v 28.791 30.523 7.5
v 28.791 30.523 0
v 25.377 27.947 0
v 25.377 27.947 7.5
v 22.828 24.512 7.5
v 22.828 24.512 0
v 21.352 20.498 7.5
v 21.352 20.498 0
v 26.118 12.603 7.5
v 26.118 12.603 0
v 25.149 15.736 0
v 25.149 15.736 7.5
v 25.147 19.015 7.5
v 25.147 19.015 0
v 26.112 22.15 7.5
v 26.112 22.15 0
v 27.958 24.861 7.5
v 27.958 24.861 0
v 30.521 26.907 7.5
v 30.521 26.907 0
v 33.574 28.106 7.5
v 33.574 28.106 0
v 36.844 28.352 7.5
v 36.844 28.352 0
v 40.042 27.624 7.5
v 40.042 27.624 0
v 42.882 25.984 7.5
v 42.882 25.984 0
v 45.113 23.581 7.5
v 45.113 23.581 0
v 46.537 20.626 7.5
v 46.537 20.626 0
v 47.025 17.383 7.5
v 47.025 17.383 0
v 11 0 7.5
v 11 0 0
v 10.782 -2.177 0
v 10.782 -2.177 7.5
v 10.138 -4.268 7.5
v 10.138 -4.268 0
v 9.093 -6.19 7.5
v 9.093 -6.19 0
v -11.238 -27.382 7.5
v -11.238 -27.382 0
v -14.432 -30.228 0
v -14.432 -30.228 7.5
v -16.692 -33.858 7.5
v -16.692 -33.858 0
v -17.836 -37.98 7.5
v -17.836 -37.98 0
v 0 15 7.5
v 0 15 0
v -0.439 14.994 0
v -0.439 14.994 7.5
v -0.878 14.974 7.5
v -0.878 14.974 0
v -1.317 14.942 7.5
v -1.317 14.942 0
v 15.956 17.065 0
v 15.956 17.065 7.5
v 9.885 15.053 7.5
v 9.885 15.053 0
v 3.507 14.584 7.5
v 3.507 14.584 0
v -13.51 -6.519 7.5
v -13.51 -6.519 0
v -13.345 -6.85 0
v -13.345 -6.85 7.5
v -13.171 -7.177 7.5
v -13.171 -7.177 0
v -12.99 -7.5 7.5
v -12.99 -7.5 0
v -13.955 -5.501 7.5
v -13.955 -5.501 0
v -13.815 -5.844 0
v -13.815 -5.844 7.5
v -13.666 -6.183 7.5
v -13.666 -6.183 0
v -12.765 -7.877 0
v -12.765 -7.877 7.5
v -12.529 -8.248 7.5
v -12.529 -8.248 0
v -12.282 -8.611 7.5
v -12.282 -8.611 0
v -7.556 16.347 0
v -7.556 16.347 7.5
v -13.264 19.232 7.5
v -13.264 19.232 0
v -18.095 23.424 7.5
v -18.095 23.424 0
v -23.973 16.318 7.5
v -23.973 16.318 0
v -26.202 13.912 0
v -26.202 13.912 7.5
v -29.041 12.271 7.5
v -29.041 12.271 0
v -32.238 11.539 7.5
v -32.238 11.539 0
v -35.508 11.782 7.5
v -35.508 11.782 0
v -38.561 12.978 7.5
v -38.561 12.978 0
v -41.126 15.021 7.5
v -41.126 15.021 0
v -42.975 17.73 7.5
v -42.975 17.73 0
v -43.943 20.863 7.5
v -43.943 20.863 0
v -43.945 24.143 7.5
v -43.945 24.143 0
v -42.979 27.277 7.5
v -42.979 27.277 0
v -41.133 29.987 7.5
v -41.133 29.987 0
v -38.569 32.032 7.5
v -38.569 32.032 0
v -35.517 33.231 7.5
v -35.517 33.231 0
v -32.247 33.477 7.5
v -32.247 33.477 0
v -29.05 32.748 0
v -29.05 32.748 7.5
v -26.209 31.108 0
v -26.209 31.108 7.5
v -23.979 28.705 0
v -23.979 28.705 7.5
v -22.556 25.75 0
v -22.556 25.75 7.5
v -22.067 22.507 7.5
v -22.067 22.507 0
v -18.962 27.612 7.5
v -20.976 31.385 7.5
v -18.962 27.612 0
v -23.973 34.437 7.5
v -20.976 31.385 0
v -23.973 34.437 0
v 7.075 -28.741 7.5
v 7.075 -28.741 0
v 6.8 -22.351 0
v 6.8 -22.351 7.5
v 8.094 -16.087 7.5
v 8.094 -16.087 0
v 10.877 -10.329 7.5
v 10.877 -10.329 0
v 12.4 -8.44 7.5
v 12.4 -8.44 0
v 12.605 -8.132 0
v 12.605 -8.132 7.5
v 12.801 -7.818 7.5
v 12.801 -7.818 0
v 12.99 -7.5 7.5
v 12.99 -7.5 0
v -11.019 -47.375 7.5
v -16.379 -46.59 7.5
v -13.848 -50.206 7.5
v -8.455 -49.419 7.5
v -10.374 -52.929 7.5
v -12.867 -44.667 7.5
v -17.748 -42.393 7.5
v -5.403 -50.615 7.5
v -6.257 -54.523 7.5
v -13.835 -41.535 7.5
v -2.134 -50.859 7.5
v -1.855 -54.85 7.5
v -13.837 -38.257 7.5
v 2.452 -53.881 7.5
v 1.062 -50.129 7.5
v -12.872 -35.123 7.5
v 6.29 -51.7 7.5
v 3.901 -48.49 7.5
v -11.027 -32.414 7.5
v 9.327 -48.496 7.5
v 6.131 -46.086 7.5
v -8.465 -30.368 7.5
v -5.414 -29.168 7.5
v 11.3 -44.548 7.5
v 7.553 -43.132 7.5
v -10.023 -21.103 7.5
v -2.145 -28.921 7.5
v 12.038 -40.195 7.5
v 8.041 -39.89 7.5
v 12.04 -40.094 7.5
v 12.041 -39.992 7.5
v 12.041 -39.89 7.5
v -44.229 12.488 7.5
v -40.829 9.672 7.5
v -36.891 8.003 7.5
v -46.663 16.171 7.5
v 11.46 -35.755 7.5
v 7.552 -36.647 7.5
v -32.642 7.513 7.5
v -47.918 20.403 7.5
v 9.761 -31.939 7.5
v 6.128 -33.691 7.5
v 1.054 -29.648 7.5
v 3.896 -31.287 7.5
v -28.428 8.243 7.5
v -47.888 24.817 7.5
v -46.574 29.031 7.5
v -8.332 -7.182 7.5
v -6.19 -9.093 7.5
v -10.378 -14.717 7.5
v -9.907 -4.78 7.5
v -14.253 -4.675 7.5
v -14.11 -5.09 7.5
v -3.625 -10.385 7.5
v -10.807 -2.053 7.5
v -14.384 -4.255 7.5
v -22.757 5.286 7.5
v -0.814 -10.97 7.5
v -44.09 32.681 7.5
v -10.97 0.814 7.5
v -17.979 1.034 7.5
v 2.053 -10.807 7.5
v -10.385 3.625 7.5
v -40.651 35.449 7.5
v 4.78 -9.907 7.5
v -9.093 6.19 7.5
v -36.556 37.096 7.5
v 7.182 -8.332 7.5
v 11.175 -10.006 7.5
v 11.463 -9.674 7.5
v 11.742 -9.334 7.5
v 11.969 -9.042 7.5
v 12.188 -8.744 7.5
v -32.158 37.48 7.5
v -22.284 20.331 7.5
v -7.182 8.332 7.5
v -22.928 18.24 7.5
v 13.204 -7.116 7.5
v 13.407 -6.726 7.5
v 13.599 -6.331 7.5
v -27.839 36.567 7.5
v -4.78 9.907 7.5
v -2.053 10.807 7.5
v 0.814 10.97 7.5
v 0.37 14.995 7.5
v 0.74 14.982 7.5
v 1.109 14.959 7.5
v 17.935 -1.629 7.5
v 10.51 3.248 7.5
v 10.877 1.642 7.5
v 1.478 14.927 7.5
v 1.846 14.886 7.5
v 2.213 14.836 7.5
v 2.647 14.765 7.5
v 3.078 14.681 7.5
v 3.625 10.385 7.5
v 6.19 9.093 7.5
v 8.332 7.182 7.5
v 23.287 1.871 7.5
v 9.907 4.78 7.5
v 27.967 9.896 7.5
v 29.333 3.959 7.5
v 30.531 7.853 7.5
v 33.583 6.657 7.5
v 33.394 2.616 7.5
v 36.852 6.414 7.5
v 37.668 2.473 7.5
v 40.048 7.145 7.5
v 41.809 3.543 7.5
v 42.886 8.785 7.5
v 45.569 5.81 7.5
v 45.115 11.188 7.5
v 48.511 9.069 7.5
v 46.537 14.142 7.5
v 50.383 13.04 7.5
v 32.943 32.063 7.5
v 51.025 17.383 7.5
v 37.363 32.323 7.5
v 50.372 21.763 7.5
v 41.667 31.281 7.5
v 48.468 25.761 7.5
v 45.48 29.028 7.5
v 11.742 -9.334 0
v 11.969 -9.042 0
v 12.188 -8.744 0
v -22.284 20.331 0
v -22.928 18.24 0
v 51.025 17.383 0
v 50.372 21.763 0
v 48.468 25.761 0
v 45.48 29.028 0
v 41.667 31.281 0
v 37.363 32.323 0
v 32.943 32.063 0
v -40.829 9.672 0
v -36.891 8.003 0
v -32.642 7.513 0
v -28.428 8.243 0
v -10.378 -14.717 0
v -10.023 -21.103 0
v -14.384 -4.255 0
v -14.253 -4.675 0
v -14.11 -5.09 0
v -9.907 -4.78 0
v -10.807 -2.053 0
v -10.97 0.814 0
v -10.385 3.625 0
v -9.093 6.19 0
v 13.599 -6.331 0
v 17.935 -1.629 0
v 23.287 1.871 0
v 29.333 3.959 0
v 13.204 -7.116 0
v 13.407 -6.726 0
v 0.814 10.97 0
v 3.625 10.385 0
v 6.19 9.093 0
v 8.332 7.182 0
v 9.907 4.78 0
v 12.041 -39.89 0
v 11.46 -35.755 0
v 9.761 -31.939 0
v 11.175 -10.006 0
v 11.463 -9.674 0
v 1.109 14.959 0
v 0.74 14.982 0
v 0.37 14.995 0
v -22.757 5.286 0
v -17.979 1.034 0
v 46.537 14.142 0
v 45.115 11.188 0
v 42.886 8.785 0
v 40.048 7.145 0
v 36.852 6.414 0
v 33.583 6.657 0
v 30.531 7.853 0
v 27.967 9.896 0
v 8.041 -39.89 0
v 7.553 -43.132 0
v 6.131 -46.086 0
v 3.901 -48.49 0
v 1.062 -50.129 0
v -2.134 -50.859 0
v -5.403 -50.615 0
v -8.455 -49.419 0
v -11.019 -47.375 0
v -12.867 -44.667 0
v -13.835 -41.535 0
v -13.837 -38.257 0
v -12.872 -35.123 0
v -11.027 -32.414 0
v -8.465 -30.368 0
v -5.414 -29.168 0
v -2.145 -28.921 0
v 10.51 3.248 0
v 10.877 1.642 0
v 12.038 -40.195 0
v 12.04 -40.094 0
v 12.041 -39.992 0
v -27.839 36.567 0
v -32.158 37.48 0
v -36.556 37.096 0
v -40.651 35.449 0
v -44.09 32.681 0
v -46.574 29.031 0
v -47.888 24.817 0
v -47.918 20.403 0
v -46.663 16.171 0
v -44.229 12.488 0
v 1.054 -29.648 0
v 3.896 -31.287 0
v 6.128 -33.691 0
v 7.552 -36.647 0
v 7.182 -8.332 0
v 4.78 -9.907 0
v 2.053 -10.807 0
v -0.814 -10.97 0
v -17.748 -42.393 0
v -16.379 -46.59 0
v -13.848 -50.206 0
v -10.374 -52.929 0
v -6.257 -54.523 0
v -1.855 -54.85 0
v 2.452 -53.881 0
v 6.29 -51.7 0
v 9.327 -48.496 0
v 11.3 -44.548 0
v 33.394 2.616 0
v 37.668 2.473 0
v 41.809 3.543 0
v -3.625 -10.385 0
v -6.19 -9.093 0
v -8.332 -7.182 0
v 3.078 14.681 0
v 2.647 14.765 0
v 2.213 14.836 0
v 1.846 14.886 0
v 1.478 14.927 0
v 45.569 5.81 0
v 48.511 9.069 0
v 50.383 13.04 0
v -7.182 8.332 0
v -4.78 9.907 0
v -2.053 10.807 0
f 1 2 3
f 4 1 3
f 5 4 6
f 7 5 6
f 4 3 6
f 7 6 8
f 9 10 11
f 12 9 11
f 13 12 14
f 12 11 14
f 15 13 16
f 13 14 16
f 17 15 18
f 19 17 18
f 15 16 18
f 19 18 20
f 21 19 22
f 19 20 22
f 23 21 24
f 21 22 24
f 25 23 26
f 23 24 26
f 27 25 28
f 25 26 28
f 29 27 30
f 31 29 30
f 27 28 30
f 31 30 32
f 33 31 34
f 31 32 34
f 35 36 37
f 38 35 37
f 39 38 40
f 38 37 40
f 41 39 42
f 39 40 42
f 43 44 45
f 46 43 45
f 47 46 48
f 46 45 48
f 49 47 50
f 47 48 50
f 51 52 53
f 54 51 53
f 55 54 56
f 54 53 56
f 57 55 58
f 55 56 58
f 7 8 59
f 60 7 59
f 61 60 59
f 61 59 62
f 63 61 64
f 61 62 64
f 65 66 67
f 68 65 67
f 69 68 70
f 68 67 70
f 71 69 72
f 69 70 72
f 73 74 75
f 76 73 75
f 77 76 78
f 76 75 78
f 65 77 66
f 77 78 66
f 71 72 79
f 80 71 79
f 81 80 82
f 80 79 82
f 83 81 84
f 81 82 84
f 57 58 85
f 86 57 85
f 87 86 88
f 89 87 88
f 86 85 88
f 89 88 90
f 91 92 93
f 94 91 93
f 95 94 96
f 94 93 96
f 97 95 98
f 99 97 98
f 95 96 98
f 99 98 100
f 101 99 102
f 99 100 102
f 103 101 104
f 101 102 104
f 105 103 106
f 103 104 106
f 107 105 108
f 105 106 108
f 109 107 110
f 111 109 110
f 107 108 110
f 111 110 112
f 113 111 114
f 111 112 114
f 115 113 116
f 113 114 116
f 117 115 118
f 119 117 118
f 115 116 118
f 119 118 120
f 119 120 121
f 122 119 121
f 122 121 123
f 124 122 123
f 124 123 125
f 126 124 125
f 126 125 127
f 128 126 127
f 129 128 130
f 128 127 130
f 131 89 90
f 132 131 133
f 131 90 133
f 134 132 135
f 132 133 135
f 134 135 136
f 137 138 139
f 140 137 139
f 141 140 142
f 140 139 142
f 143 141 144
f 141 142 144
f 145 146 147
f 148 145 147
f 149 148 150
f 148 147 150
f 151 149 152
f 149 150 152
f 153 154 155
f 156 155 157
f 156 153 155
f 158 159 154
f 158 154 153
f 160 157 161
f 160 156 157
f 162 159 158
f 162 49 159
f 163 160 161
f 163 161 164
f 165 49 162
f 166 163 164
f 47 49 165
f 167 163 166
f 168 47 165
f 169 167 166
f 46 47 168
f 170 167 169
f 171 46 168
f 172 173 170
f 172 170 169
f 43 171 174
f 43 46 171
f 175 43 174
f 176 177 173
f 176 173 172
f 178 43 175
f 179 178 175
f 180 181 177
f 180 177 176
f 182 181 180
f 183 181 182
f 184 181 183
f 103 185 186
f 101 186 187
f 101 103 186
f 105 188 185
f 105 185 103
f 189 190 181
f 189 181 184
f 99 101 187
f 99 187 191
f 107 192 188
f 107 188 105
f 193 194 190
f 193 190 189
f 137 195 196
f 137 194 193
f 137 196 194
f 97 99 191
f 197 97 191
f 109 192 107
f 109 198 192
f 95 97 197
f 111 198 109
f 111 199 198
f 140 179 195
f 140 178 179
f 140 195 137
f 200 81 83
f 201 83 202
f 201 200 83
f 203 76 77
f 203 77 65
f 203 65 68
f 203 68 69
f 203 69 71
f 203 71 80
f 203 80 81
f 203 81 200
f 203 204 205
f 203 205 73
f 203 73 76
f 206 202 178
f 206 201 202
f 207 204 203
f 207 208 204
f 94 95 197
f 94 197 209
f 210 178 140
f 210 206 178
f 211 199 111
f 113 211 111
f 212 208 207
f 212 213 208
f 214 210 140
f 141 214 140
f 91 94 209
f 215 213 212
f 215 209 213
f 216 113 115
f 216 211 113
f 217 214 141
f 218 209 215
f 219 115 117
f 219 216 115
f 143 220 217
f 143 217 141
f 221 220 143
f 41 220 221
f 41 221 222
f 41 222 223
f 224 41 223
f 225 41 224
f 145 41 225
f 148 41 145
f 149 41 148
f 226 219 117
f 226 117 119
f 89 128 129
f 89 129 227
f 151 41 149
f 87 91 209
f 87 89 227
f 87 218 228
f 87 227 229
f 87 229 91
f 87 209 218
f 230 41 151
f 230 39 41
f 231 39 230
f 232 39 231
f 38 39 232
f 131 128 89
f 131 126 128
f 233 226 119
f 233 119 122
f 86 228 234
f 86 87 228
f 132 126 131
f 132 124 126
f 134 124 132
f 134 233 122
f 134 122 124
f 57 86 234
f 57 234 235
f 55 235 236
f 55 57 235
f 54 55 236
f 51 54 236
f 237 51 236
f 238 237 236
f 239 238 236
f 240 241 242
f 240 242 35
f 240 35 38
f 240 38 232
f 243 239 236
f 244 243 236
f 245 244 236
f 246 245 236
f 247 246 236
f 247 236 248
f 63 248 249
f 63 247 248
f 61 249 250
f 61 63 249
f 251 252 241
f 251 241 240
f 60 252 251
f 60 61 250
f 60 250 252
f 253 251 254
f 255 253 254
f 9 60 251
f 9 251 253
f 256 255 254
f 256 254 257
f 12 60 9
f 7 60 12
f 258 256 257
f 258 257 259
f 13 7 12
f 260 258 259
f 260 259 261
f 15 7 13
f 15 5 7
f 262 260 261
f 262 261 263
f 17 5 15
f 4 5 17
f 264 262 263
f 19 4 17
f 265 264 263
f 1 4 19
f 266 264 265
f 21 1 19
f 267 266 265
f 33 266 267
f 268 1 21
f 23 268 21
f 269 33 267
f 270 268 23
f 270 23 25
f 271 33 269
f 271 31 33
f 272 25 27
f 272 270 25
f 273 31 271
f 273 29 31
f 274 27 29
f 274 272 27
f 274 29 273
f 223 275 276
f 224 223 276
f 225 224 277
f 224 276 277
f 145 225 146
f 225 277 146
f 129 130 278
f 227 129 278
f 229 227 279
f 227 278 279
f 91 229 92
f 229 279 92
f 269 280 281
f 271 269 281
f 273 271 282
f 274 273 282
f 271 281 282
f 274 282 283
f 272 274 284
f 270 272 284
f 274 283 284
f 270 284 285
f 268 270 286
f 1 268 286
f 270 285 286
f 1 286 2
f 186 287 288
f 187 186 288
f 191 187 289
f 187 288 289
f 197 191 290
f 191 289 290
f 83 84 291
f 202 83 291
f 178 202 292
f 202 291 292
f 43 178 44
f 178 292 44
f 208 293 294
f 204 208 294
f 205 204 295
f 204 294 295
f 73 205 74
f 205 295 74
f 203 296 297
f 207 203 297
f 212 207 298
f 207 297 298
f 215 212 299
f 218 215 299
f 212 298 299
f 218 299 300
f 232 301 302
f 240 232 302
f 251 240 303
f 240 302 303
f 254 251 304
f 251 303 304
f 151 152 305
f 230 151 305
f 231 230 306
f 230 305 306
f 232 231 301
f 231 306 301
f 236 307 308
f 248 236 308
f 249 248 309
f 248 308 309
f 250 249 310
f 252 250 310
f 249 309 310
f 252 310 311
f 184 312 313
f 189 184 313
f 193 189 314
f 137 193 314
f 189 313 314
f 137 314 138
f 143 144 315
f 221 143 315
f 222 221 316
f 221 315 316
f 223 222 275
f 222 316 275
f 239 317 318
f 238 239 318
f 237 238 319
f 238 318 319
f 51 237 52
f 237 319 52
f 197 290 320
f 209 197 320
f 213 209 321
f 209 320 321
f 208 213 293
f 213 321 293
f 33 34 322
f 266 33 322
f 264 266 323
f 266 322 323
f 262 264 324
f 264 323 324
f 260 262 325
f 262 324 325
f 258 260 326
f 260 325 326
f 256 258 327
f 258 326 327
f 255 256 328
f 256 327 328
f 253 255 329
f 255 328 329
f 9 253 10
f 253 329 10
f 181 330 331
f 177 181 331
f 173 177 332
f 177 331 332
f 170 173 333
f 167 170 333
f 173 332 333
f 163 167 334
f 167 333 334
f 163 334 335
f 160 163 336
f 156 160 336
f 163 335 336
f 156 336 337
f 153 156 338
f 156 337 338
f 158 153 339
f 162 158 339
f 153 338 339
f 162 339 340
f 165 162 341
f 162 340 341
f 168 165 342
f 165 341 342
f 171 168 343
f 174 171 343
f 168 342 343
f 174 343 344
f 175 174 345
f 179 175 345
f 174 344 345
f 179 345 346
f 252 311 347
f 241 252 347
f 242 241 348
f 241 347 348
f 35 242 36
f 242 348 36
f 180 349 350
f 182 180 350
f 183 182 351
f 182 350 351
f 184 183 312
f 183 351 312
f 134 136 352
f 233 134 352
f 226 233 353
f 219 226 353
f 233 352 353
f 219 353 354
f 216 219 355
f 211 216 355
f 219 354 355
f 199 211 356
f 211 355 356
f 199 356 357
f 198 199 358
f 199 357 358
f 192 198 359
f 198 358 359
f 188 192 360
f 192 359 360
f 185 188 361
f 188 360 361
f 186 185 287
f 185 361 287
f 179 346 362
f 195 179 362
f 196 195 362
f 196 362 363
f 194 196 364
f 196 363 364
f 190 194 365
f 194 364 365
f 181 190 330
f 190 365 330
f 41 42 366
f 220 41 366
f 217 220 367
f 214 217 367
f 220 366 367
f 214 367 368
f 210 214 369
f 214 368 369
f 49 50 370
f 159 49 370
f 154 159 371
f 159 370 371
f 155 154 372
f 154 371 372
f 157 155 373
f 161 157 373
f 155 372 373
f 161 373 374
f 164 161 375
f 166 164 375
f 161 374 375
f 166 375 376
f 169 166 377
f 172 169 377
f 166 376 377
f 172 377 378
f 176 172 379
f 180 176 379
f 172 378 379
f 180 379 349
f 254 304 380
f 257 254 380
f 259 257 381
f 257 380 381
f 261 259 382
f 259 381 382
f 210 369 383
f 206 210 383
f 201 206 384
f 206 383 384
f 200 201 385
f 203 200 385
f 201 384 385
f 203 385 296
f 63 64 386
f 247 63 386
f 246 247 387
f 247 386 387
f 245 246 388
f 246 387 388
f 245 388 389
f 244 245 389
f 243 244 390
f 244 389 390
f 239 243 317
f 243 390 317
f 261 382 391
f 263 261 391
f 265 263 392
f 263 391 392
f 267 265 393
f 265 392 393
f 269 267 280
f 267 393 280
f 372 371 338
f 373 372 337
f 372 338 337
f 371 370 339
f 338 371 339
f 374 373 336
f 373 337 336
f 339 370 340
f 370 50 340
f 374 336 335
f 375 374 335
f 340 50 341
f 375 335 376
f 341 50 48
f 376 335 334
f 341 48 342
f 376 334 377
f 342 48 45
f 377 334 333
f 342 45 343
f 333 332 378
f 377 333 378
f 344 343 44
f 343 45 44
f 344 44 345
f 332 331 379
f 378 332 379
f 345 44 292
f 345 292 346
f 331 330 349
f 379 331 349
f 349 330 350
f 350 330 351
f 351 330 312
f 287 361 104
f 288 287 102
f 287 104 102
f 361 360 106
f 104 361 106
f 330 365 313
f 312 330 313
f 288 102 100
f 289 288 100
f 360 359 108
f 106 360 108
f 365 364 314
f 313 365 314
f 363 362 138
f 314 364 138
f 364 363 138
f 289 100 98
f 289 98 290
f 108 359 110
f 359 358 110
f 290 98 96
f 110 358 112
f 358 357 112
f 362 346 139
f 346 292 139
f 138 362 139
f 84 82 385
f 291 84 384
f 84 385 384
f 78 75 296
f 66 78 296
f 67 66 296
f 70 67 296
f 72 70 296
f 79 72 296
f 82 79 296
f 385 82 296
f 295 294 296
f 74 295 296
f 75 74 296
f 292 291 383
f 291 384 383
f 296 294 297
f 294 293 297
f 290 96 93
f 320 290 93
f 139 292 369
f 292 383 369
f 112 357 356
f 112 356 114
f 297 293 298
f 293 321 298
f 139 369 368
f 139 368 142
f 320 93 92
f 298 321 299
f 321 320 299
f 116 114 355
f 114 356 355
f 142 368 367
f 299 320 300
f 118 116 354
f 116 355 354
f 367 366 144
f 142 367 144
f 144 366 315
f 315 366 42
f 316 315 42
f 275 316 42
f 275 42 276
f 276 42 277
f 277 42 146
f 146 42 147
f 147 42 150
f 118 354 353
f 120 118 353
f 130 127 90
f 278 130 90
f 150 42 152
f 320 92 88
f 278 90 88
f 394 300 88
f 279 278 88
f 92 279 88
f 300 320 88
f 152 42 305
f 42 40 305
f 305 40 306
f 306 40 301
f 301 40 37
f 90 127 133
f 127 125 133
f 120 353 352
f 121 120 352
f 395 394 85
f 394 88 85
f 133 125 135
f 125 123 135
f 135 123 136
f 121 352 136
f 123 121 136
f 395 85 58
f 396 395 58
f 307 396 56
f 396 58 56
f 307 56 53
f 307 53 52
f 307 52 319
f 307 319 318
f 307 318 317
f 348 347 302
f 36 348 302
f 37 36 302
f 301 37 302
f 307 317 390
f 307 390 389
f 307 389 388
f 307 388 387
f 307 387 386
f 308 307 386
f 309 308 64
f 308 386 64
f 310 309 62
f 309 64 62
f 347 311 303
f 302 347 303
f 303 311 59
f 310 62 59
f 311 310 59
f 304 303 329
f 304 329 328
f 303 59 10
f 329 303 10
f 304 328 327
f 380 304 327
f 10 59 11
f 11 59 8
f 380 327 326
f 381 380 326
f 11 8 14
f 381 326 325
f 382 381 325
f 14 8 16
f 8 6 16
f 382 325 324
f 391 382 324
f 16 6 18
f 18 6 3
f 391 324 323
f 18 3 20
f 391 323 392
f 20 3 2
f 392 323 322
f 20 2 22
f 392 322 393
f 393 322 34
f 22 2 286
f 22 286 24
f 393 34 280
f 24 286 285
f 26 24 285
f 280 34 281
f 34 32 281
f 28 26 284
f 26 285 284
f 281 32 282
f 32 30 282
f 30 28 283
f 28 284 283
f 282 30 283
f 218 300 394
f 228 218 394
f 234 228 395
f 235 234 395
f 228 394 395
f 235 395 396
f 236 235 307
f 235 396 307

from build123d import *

# Parameters (mm, degrees)
F1_DEPTH = 7.5


with BuildPart() as f1:
    # F0 (on Top) → F1 (new body)
    with BuildSketch(Plane.XY):
        with BuildLine():
            ThreePointArc((9.9070001123, 4.7803084394), (10.7232691199, 2.4518359208), (11, 0))
            ThreePointArc((11, 0), (10.5125414298, -3.2382823666), (9.0933686025, -6.1895595528))
            Line((9.0933686025, -6.1895595528), (12.2828647672, -8.3605456107))
            ThreePointArc((12.2828647672, -8.3605456107), (12.9170786369, -7.3303985813), (13.5985312991, -6.3308724918))
            ThreePointArc((13.5985312991, -6.3308724918), (14.6454424564, -3.2420695947), (15, 0))
            ThreePointArc((15, 0), (14.6226397089, 3.3434126193), (13.5095456076, 6.5186024173))
            Line((13.5095456076, 6.5186024173), (9.9070001123, 4.7803084394))
        make_face()
        with BuildLine():
            ThreePointArc((0.8136315097, 10.9698679922), (6.1895595528, 9.0933686025), (9.9070001123, 4.7803084394))
            Line((9.9070001123, 4.7803084394), (13.5095456076, 6.5186024173))
            ThreePointArc((13.5095456076, 6.5186024173), (9.4154652066, 11.6768580939), (3.5065394099, 14.5843814187))
            ThreePointArc((3.5065394099, 14.5843814187), (2.3000626139, 14.6729470743), (1.0990125047, 14.817545725))
            Line((1.0990125047, 14.817545725), (0.8136315097, 10.9698679922))
        make_face()
        with BuildLine():
            Line((12.2828647672, -8.3605456107), (9.0933686025, -6.1895595528))
            ThreePointArc((9.0933686025, -6.1895595528), (4.7803084394, -9.9070001123), (-0.8136315097, -10.9698679922))
            Line((-0.8136315097, -10.9698679922), (-1.1094975133, -14.9589108985))
            ThreePointArc((-1.1094975133, -14.9589108985), (5.4047231424, -13.9924611043), (10.8771751021, -10.3289429177))
            ThreePointArc((10.8771751021, -10.3289429177), (11.5571136078, -9.3283861911), (12.2828647672, -8.3605456107))
        make_face()
        with BuildLine():
            ThreePointArc((-9.0933686025, 6.1895595528), (-4.7803084394, 9.9070001123), (0.8136315097, 10.9698679922))
            Line((0.8136315097, 10.9698679922), (1.0990125047, 14.817545725))
            ThreePointArc((1.0990125047, 14.817545725), (-0.1102279272, 14.8517175329), (-1.3165692436, 14.9421098051))
            ThreePointArc((-1.3165692436, 14.9421098051), (-7.5897795036, 12.9381315145), (-12.4000480944, 8.4403084812))
            Line((-12.4000480944, 8.4403084812), (-9.0933686025, 6.1895595528))
        make_face()
        with BuildLine():
            Line((22.5159093461, 10.8643373622), (13.5095456076, 6.5186024173))
            ThreePointArc((13.5095456076, 6.5186024173), (14.6226397089, 3.3434126193), (15, 0))
            ThreePointArc((15, 0), (14.6454424564, -3.2420695947), (13.5985312991, -6.3308724918))
            ThreePointArc((13.5985312991, -6.3308724918), (20.5029640043, 0.2861263258), (29.3329113564, 3.958713165))
            ThreePointArc((29.3329113564, 3.958713165), (25.3505772753, 6.8450563796), (22.5159093461, 10.8643373622))
        make_face()
        with BuildLine():
            ThreePointArc((3.5065394099, 14.5843814187), (9.4154652066, 11.6768580939), (13.5095456076, 6.5186024173))
            Line((13.5095456076, 6.5186024173), (22.5159093461, 10.8643373622))
            ThreePointArc((22.5159093461, 10.8643373622), (21.1336653873, 15.5844394293), (21.3524517486, 20.4978999628))
            ThreePointArc((21.3524517486, 20.4978999628), (12.9828009771, 15.8713666716), (3.5065394099, 14.5843814187))
        make_face()
        with BuildLine():
            Line((-1.1094975133, -14.9589108985), (-0.8136315097, -10.9698679922))
            ThreePointArc((-0.8136315097, -10.9698679922), (-6.1895595528, -9.0933686025), (-9.9070001123, -4.7803084394))
            Line((-9.9070001123, -4.7803084394), (-13.381877272, -6.4570001143))
            ThreePointArc((-13.381877272, -6.4570001143), (-12.8068507097, -7.5213189516), (-12.2819620555, -8.6112373133))
            ThreePointArc((-12.2819620555, -8.6112373133), (-7.4098608173, -13.0420076165), (-1.1094975133, -14.9589108985))
        make_face()
        with BuildLine():
            ThreePointArc((12.9903810568, -7.5), (12.6320125035, -7.9264822577), (12.2828647672, -8.3605456107))
            Line((12.2828647672, -8.3605456107), (12.4000480944, -8.4403084812))
            ThreePointArc((12.4000480944, -8.4403084812), (12.7039174324, -7.9756179616), (12.9903810568, -7.5))
        make_face()
        with BuildLine():
            ThreePointArc((13.5985312991, -6.3308724918), (12.9170786369, -7.3303985813), (12.2828647672, -8.3605456107))
            ThreePointArc((12.2828647672, -8.3605456107), (12.6320125035, -7.9264822577), (12.9903810568, -7.5))
            ThreePointArc((12.9903810568, -7.5), (13.3073017494, -6.9221181838), (13.5985312991, -6.3308724918))
        make_face()
        with BuildLine():
            ThreePointArc((11.7417808873, -9.3343763367), (12.0071054891, -8.8445620945), (12.2828647672, -8.3605456107))
            ThreePointArc((12.2828647672, -8.3605456107), (11.5571136078, -9.3283861911), (10.8771751021, -10.3289429177))
            ThreePointArc((10.8771751021, -10.3289429177), (11.3204056104, -9.8411593228), (11.7417808873, -9.3343763367))
        make_face()
        with BuildLine():
            Line((12.4000480944, -8.4403084812), (12.2828647672, -8.3605456107))
            ThreePointArc((12.2828647672, -8.3605456107), (12.0071054891, -8.8445620945), (11.7417808873, -9.3343763367))
            ThreePointArc((11.7417808873, -9.3343763367), (12.0791893759, -8.8934348832), (12.4000480944, -8.4403084812))
        make_face()
        with BuildLine():
            ThreePointArc((-9.9070001123, -4.7803084394), (-10.9698679922, 0.8136315097), (-9.0933686025, 6.1895595528))
            Line((-9.0933686025, 6.1895595528), (-12.4000480944, 8.4403084812))
            ThreePointArc((-12.4000480944, 8.4403084812), (-14.8201883489, 2.3156030104), (-14.383714512, -4.255438501))
            ThreePointArc((-14.383714512, -4.255438501), (-13.8571762217, -5.3445608832), (-13.381877272, -6.4570001143))
            Line((-13.381877272, -6.4570001143), (-9.9070001123, -4.7803084394))
        make_face()
        with BuildLine():
            ThreePointArc((-1.3165692436, 14.9421098051), (-0.1102279272, 14.8517175329), (1.0990125047, 14.817545725))
            ThreePointArc((1.0990125047, 14.817545725), (0.5485287461, 14.9028848578), (0, 15))
            ThreePointArc((0, 15), (-0.6589206796, 14.9855204627), (-1.3165692436, 14.9421098051))
        make_face()
        with BuildLine():
            ThreePointArc((2.2129165924, 14.8358687024), (1.6560627147, 14.8207394268), (1.0990125047, 14.817545725))
            ThreePointArc((1.0990125047, 14.817545725), (2.3000626139, 14.6729470743), (3.5065394099, 14.5843814187))
            ThreePointArc((3.5065394099, 14.5843814187), (2.862491171, 14.7243385011), (2.2129165924, 14.8358687024))
        make_face()
        with BuildLine():
            ThreePointArc((0, 15), (0.5485287461, 14.9028848578), (1.0990125047, 14.817545725))
            Line((1.0990125047, 14.817545725), (1.1094975133, 14.9589108985))
            ThreePointArc((1.1094975133, 14.9589108985), (0.5551290495, 14.9897242049), (0, 15))
        make_face()
        with BuildLine():
            Line((1.1094975133, 14.9589108985), (1.0990125047, 14.817545725))
            ThreePointArc((1.0990125047, 14.817545725), (1.6560627147, 14.8207394268), (2.2129165924, 14.8358687024))
            ThreePointArc((2.2129165924, 14.8358687024), (1.6623458479, 14.9076022982), (1.1094975133, 14.9589108985))
        make_face()
        with BuildLine():
            ThreePointArc((21.3524517486, 20.4978999628), (21.1336653873, 15.5844394293), (22.5159093461, 10.8643373622))
            ThreePointArc((22.5159093461, 10.8643373622), (25.3505772753, 6.8450563796), (29.3329113564, 3.958713165))
            ThreePointArc((29.3329113564, 3.958713165), (35.5965178278, 4.510878729), (41.8094702076, 3.5429554029))
            ThreePointArc((41.8094702076, 3.5429554029), (48.5106507633, 9.0691027835), (51.0254549537, 17.3829397795))
            ThreePointArc((51.0254549537, 17.3829397795), (43.6571032384, 30.2964189566), (28.7910623593, 30.5230906078))
            ThreePointArc((28.7910623593, 30.5230906078), (25.682469555, 25.0573515346), (21.3524517486, 20.4978999628))
        make_face()
        with BuildLine():
            ThreePointArc((47.0254549537, 17.3829397795), (38.4772908745, 6.6596706596), (26.1184548414, 12.6026313401))
            ThreePointArc((26.1184548414, 12.6026313401), (33.5736190329, 28.1062088994), (47.0254549537, 17.3829397795))
        make_face(mode=Mode.SUBTRACT)
        with BuildLine():
            Line((-1.8491625221, -24.9315181641), (-1.1094975133, -14.9589108985))
            ThreePointArc((-1.1094975133, -14.9589108985), (-7.4098608173, -13.0420076165), (-12.2819620555, -8.6112373133))
            ThreePointArc((-12.2819620555, -8.6112373133), (-10.0036893353, -17.8991508435), (-11.238109511, -27.3824029841))
            ThreePointArc((-11.238109511, -27.3824029841), (-6.7472959226, -25.3767721108), (-1.8491625221, -24.9315181641))
        make_face()
        with BuildLine():
            ThreePointArc((10.8771751021, -10.3289429177), (5.4047231424, -13.9924611043), (-1.1094975133, -14.9589108985))
            Line((-1.1094975133, -14.9589108985), (-1.8491625221, -24.9315181641))
            ThreePointArc((-1.8491625221, -24.9315181641), (2.9296877559, -26.0945108152), (7.0754762177, -28.7407156288))
            ThreePointArc((7.0754762177, -28.7407156288), (7.2536062418, -19.1791187943), (10.8771751021, -10.3289429177))
        make_face()
        with BuildLine():
            Line((-20.666746824, 14.0671808019), (-12.4000480944, 8.4403084812))
            ThreePointArc((-12.4000480944, 8.4403084812), (-7.5897795036, 12.9381315145), (-1.3165692436, 14.9421098051))
            ThreePointArc((-1.3165692436, 14.9421098051), (-10.499274669, 17.6130245177), (-18.0948018454, 23.4236898191))
            ThreePointArc((-18.0948018454, 23.4236898191), (-18.073798285, 22.9658035339), (-18.0667949184, 22.5074892831))
            ThreePointArc((-18.0667949184, 22.5074892831), (-18.7315111504, 18.0916496922), (-20.666746824, 14.0671808019))
        make_face()
        with BuildLine():
            ThreePointArc((-14.383714512, -4.255438501), (-14.8201883489, 2.3156030104), (-12.4000480944, 8.4403084812))
            Line((-12.4000480944, 8.4403084812), (-20.666746824, 14.0671808019))
            ThreePointArc((-20.666746824, 14.0671808019), (-24.0633531432, 10.5100713858), (-28.4279279664, 8.242815666))
            ThreePointArc((-28.4279279664, 8.242815666), (-20.236407219, 3.3077521227), (-14.383714512, -4.255438501))
        make_face()
        with BuildLine():
            ThreePointArc((-12.9903810568, -7.5), (-13.1805412496, -6.9764026001), (-13.381877272, -6.4570001143))
            Line((-13.381877272, -6.4570001143), (-13.5095456076, -6.5186024173))
            ThreePointArc((-13.5095456076, -6.5186024173), (-13.2590464819, -7.0141062432), (-12.9903810568, -7.5))
        make_face()
        with BuildLine():
            ThreePointArc((-12.2819620555, -8.6112373133), (-12.8068507097, -7.5213189516), (-13.381877272, -6.4570001143))
            ThreePointArc((-13.381877272, -6.4570001143), (-13.1805412496, -6.9764026001), (-12.9903810568, -7.5))
            ThreePointArc((-12.9903810568, -7.5), (-12.6483810698, -8.0634022789), (-12.2819620555, -8.6112373133))
        make_face()
        with BuildLine():
            ThreePointArc((-13.9546974797, -5.5014923657), (-13.6631682038, -5.9761773322), (-13.381877272, -6.4570001143))
            ThreePointArc((-13.381877272, -6.4570001143), (-13.8571762217, -5.3445608832), (-14.383714512, -4.255438501))
            ThreePointArc((-14.383714512, -4.255438501), (-14.1828967814, -4.8831791784), (-13.9546974797, -5.5014923657))
        make_face()
        with BuildLine():
            Line((-13.5095456076, -6.5186024173), (-13.381877272, -6.4570001143))
            ThreePointArc((-13.381877272, -6.4570001143), (-13.6631682038, -5.9761773322), (-13.9546974797, -5.5014923657))
            ThreePointArc((-13.9546974797, -5.5014923657), (-13.7415352237, -6.014167415), (-13.5095456076, -6.5186024173))
        make_face()
        with BuildLine():
            ThreePointArc((28.7910623593, 30.5230906078), (23.979309946, 26.3210822294), (21.3524517486, 20.4978999628))
            ThreePointArc((21.3524517486, 20.4978999628), (25.682469555, 25.0573515346), (28.7910623593, 30.5230906078))
        make_face()
        with BuildLine():
            ThreePointArc((41.8094702076, 3.5429554029), (35.5965178278, 4.510878729), (29.3329113564, 3.958713165))
            ThreePointArc((29.3329113564, 3.958713165), (35.5258855723, 2.3912610732), (41.8094702076, 3.5429554029))
        make_face()
        with BuildLine():
            ThreePointArc((7.0754762177, -28.7407156288), (2.9296877559, -26.0945108152), (-1.8491625221, -24.9315181641))
            ThreePointArc((-1.8491625221, -24.9315181641), (-6.7472959226, -25.3767721108), (-11.238109511, -27.3824029841))
            ThreePointArc((-11.238109511, -27.3824029841), (-13.8917233412, -33.0829280896), (-17.8364457204, -37.97954102))
            ThreePointArc((-17.8364457204, -37.97954102), (-4.0681575486, -54.849339961), (12.0382406887, -40.195336709))
            ThreePointArc((12.0382406887, -40.195336709), (8.8590682031, -34.7703468338), (7.0754762177, -28.7407156288))
        make_face()
        with BuildLine():
            ThreePointArc((8.0413399646, -39.8904290626), (-11.0193655444, -47.3754158158), (-2.1450285256, -28.9205610704))
            ThreePointArc((-2.1450285256, -28.9205610704), (5.1020454737, -32.4054423093), (8.0413399646, -39.8904290626))
        make_face(mode=Mode.SUBTRACT)
        with BuildLine():
            ThreePointArc((12.0413399646, -39.8904290626), (10.7437493111, -33.7876446078), (7.0754762177, -28.7407156288))
            ThreePointArc((7.0754762177, -28.7407156288), (8.8590682031, -34.7703468338), (12.0382406887, -40.195336709))
            ThreePointArc((12.0382406887, -40.195336709), (12.0405651256, -40.0428907613), (12.0413399646, -39.8904290626))
        make_face()
        with BuildLine():
            ThreePointArc((-28.4279279664, 8.242815666), (-24.0633531432, 10.5100713858), (-20.666746824, 14.0671808019))
            ThreePointArc((-20.666746824, 14.0671808019), (-18.7315111504, 18.0916496922), (-18.0667949184, 22.5074892831))
            ThreePointArc((-18.0667949184, 22.5074892831), (-18.073798285, 22.9658035339), (-18.0948018454, 23.4236898191))
            ThreePointArc((-18.0948018454, 23.4236898191), (-21.7047944866, 28.5720493606), (-23.9730244872, 34.4365856171))
            ThreePointArc((-23.9730244872, 34.4365856171), (-45.4668430127, 30.9477977642), (-40.829303048, 9.6722461012))
            ThreePointArc((-40.829303048, 9.6722461012), (-34.541537758, 9.7129952992), (-28.4279279664, 8.242815666))
        make_face()
        with BuildLine():
            ThreePointArc((-22.0667949184, 22.5074892831), (-22.5542534885, 19.2692069164), (-23.9734263158, 16.3179297302))
            ThreePointArc((-23.9734263158, 16.3179297302), (-43.5793363482, 25.7457716497), (-22.0667949184, 22.5074892831))
        make_face(mode=Mode.SUBTRACT)
        with BuildLine():
            ThreePointArc((-23.9730244872, 34.4365856171), (-21.7047944866, 28.5720493606), (-18.0948018454, 23.4236898191))
            ThreePointArc((-18.0948018454, 23.4236898191), (-19.8338356226, 29.5706888609), (-23.9730244872, 34.4365856171))
        make_face()
        with BuildLine():
            ThreePointArc((-17.8364457204, -37.97954102), (-13.8917233412, -33.0829280896), (-11.238109511, -27.3824029841))
            ThreePointArc((-11.238109511, -27.3824029841), (-15.6920499497, -31.9619499341), (-17.8364457204, -37.97954102))
        make_face()
        with BuildLine():
            ThreePointArc((-40.829303048, 9.6722461012), (-34.7843808387, 7.6061504638), (-28.4279279664, 8.242815666))
            ThreePointArc((-28.4279279664, 8.242815666), (-34.541537758, 9.7129952992), (-40.829303048, 9.6722461012))
        make_face()
    extrude(amount=F1_DEPTH)


solid = f1.part
